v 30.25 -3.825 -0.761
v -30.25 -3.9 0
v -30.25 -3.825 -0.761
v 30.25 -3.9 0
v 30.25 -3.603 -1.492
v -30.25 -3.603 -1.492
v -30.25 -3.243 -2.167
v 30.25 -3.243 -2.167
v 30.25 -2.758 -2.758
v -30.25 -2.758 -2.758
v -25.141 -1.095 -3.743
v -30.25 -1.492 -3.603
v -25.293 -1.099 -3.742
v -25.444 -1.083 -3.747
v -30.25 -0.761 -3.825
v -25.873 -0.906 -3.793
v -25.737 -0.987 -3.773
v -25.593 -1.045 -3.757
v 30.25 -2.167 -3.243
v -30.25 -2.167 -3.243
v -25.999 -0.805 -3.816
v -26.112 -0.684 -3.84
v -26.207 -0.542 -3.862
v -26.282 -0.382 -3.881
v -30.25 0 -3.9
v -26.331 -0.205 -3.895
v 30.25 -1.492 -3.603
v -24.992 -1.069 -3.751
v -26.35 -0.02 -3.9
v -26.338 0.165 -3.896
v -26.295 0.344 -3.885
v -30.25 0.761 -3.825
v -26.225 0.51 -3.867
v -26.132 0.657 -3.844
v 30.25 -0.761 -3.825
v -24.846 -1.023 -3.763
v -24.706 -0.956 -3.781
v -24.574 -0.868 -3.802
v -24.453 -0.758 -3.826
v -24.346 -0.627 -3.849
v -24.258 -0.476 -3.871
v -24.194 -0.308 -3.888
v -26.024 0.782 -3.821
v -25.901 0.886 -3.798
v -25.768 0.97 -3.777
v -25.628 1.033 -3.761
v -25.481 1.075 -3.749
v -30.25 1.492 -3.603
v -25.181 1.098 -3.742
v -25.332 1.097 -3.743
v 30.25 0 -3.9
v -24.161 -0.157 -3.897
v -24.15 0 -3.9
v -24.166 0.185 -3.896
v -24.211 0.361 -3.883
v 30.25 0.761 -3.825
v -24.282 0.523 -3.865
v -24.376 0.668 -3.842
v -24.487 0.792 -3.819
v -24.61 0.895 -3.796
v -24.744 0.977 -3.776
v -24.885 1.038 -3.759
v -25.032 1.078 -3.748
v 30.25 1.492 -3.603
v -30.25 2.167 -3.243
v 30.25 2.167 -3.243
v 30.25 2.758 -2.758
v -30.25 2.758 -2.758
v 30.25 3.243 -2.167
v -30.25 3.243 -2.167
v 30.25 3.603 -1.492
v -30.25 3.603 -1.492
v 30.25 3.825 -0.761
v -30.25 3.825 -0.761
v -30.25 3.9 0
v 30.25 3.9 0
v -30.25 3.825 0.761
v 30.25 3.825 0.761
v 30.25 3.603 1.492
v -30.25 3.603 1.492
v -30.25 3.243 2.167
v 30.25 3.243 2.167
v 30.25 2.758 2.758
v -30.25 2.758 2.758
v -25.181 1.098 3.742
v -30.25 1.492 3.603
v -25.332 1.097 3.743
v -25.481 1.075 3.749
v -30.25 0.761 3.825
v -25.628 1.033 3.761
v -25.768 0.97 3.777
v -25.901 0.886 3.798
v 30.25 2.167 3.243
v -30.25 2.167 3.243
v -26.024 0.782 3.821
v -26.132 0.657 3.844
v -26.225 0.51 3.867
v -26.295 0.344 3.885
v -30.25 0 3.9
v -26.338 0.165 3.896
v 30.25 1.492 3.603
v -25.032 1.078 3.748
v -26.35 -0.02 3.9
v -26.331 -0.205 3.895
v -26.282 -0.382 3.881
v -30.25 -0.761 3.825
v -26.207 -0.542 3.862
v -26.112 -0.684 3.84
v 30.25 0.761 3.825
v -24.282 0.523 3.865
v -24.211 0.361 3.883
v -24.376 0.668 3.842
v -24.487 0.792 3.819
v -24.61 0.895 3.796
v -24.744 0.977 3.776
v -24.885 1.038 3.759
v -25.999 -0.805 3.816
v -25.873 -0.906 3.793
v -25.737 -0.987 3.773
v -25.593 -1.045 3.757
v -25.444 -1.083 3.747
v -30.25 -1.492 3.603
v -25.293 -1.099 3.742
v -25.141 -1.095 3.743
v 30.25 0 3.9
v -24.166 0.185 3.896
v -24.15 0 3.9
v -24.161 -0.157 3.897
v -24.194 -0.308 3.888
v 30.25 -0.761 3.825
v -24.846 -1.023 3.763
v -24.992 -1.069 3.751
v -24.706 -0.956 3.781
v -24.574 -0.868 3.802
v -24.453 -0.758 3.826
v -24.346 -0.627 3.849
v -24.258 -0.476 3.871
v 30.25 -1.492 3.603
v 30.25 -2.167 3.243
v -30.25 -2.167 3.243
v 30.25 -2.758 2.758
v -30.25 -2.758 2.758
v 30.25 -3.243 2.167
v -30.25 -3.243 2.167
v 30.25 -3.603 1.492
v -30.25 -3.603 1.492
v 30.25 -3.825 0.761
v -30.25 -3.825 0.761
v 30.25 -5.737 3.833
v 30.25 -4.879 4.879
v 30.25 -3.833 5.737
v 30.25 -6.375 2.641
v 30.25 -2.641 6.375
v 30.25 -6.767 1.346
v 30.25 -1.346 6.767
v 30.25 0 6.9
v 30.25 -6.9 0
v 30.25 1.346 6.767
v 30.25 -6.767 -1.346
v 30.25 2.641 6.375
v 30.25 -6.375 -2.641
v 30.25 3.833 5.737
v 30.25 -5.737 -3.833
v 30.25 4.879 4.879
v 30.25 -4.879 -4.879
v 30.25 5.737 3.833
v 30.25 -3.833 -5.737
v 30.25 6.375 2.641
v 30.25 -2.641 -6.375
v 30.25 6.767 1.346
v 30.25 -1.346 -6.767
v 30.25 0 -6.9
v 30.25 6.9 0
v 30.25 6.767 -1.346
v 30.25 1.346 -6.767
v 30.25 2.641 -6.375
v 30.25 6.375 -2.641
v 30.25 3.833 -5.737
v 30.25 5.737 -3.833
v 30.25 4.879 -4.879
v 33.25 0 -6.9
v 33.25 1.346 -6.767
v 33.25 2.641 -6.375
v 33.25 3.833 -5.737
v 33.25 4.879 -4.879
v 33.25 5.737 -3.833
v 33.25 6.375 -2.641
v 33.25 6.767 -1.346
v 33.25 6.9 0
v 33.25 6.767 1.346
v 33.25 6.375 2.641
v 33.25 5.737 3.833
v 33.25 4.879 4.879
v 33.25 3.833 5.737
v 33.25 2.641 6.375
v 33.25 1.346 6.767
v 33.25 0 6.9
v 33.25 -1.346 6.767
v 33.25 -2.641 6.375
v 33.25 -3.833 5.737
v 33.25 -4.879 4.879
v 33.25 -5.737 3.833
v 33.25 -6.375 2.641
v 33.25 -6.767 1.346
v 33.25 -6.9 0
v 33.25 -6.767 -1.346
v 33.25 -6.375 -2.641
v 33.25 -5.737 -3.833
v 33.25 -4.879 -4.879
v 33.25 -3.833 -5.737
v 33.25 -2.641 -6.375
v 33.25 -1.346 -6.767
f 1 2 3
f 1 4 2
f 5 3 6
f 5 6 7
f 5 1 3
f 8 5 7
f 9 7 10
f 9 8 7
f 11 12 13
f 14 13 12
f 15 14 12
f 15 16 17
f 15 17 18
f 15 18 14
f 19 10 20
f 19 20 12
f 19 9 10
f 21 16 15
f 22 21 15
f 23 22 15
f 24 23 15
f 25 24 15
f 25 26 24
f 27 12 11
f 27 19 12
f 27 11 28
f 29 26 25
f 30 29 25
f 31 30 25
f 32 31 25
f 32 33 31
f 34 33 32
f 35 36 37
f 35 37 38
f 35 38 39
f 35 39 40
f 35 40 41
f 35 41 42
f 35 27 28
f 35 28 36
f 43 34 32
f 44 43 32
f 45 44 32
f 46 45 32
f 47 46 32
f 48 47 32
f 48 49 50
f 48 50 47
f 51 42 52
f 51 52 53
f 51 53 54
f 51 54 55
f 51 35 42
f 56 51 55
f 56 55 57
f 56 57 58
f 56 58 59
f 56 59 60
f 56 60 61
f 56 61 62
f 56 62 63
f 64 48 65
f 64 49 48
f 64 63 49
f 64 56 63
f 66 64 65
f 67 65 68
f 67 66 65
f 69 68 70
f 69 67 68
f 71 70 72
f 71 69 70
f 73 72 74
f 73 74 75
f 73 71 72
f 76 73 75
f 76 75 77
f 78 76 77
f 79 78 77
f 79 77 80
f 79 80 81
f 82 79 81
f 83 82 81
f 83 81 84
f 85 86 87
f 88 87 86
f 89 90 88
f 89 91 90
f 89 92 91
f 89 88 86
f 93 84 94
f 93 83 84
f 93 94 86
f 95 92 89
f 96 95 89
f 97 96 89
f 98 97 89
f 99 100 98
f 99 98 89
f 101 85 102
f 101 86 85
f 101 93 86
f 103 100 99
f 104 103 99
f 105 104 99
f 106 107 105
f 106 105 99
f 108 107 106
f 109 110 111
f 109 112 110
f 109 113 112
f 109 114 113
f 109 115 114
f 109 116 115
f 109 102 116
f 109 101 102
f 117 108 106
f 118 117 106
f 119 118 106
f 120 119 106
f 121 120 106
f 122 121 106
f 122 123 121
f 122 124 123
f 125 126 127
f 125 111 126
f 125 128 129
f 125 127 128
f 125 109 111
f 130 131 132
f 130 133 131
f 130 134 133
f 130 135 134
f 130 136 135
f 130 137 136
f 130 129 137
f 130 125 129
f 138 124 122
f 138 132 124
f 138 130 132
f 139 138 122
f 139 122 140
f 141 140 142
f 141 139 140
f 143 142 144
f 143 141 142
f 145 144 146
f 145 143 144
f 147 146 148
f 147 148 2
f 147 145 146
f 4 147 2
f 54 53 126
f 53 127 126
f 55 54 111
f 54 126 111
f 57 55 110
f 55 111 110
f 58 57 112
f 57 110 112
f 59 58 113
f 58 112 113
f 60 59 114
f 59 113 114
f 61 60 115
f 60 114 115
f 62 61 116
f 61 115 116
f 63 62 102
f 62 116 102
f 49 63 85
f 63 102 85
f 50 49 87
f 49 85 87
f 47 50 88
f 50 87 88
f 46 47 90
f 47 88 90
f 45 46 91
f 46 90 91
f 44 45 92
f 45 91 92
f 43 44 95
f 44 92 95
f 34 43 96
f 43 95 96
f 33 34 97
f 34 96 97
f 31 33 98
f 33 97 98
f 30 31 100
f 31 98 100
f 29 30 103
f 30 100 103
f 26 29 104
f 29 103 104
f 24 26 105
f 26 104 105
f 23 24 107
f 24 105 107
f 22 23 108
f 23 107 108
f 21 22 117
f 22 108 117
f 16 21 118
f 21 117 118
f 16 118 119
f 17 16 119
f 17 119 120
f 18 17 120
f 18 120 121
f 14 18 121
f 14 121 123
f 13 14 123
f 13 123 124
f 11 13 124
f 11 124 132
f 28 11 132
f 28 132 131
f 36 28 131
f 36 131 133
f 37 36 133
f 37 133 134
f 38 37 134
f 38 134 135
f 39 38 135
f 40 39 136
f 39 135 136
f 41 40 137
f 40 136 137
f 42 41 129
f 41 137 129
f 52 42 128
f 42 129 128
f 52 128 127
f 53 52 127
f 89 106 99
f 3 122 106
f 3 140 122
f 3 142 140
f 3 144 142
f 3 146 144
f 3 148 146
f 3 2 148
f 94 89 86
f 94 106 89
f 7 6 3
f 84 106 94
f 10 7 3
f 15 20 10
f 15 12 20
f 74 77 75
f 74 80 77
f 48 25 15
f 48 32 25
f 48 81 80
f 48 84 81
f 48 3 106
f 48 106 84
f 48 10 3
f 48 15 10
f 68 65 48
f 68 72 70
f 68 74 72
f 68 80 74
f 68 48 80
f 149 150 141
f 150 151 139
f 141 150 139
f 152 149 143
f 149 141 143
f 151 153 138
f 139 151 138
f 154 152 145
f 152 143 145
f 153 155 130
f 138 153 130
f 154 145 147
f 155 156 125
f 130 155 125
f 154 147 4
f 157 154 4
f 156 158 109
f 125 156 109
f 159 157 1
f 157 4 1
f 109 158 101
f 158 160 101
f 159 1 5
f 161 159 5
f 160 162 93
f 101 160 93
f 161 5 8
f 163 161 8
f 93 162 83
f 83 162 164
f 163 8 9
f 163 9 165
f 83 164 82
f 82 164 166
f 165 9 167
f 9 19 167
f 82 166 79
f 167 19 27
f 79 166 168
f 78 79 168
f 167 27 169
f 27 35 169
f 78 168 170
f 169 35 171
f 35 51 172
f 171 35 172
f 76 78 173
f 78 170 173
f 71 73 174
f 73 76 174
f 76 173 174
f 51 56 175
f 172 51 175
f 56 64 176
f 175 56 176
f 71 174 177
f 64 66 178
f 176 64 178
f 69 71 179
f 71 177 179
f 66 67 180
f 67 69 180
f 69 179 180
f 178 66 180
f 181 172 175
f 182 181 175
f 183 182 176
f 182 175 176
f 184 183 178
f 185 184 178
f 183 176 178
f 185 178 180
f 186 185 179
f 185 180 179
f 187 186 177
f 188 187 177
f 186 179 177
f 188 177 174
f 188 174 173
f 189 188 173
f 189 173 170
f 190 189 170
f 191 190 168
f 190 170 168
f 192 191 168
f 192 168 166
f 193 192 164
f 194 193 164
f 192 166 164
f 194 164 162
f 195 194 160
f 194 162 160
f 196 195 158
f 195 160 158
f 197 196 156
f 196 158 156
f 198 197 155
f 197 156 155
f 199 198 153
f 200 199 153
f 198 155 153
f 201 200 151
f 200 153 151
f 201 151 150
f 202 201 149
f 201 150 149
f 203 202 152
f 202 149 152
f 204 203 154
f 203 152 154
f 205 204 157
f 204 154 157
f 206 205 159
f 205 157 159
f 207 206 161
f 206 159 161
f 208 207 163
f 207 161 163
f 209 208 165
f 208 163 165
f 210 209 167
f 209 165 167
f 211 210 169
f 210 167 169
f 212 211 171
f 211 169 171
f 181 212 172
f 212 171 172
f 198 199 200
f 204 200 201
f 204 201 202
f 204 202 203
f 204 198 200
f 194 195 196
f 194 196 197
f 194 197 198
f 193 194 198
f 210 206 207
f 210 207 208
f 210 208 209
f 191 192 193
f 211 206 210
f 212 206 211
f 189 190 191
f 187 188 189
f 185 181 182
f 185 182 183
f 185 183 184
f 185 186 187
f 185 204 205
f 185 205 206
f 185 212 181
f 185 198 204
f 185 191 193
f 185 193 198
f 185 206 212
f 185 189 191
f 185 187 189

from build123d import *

# Parameters (mm, degrees)
SKETCH2_3_R             = 1.1
CUT_EXTRUDE1_DEPTH      = 4.9
CUT_EXTRUDE1_DEPTH_BACK = 4.9
SKETCH3_R               = 6.9
BOSS_EXTRUDE1_DEPTH     = 3


with BuildPart() as part:
    # Sketch2 → Revolve2 (revolve)
    with BuildSketch(Plane.XY):
        with BuildLine():
            Line((30.25, 0), (-24.15, 0))
            ThreePointArc((-24.15, 0), (-25.25, -1.1), (-26.35, 0))
            Line((-26.35, 0), (-30.25, 0))
            Line((-30.25, 0), (-30.25, -3.9))
            Line((-30.25, -3.9), (30.25, -3.9))
            Line((30.25, -3.9), (30.25, 0))
        make_face()
    revolve(axis=Axis((-30.25, 0, 0), (1, 0, 0)))

    # Sketch2<3> → Cut-Extrude1 (cut, two sides)
    with BuildSketch(Plane.XY) as cut_extrude1_sk:
        with Locations((-25.25, 0)):
            Circle(SKETCH2_3_R)
    extrude(amount=CUT_EXTRUDE1_DEPTH, mode=Mode.SUBTRACT)
    extrude(cut_extrude1_sk.sketch, amount=-CUT_EXTRUDE1_DEPTH_BACK, mode=Mode.SUBTRACT)

    # Sketch3 → Boss-Extrude1 (add)
    with BuildSketch(Plane(origin=(30.25, 0, 0), x_dir=(0, 0, -1), z_dir=(1, 0, 0))):
        Circle(SKETCH3_R)
    extrude(amount=BOSS_EXTRUDE1_DEPTH)


solid = part.part
